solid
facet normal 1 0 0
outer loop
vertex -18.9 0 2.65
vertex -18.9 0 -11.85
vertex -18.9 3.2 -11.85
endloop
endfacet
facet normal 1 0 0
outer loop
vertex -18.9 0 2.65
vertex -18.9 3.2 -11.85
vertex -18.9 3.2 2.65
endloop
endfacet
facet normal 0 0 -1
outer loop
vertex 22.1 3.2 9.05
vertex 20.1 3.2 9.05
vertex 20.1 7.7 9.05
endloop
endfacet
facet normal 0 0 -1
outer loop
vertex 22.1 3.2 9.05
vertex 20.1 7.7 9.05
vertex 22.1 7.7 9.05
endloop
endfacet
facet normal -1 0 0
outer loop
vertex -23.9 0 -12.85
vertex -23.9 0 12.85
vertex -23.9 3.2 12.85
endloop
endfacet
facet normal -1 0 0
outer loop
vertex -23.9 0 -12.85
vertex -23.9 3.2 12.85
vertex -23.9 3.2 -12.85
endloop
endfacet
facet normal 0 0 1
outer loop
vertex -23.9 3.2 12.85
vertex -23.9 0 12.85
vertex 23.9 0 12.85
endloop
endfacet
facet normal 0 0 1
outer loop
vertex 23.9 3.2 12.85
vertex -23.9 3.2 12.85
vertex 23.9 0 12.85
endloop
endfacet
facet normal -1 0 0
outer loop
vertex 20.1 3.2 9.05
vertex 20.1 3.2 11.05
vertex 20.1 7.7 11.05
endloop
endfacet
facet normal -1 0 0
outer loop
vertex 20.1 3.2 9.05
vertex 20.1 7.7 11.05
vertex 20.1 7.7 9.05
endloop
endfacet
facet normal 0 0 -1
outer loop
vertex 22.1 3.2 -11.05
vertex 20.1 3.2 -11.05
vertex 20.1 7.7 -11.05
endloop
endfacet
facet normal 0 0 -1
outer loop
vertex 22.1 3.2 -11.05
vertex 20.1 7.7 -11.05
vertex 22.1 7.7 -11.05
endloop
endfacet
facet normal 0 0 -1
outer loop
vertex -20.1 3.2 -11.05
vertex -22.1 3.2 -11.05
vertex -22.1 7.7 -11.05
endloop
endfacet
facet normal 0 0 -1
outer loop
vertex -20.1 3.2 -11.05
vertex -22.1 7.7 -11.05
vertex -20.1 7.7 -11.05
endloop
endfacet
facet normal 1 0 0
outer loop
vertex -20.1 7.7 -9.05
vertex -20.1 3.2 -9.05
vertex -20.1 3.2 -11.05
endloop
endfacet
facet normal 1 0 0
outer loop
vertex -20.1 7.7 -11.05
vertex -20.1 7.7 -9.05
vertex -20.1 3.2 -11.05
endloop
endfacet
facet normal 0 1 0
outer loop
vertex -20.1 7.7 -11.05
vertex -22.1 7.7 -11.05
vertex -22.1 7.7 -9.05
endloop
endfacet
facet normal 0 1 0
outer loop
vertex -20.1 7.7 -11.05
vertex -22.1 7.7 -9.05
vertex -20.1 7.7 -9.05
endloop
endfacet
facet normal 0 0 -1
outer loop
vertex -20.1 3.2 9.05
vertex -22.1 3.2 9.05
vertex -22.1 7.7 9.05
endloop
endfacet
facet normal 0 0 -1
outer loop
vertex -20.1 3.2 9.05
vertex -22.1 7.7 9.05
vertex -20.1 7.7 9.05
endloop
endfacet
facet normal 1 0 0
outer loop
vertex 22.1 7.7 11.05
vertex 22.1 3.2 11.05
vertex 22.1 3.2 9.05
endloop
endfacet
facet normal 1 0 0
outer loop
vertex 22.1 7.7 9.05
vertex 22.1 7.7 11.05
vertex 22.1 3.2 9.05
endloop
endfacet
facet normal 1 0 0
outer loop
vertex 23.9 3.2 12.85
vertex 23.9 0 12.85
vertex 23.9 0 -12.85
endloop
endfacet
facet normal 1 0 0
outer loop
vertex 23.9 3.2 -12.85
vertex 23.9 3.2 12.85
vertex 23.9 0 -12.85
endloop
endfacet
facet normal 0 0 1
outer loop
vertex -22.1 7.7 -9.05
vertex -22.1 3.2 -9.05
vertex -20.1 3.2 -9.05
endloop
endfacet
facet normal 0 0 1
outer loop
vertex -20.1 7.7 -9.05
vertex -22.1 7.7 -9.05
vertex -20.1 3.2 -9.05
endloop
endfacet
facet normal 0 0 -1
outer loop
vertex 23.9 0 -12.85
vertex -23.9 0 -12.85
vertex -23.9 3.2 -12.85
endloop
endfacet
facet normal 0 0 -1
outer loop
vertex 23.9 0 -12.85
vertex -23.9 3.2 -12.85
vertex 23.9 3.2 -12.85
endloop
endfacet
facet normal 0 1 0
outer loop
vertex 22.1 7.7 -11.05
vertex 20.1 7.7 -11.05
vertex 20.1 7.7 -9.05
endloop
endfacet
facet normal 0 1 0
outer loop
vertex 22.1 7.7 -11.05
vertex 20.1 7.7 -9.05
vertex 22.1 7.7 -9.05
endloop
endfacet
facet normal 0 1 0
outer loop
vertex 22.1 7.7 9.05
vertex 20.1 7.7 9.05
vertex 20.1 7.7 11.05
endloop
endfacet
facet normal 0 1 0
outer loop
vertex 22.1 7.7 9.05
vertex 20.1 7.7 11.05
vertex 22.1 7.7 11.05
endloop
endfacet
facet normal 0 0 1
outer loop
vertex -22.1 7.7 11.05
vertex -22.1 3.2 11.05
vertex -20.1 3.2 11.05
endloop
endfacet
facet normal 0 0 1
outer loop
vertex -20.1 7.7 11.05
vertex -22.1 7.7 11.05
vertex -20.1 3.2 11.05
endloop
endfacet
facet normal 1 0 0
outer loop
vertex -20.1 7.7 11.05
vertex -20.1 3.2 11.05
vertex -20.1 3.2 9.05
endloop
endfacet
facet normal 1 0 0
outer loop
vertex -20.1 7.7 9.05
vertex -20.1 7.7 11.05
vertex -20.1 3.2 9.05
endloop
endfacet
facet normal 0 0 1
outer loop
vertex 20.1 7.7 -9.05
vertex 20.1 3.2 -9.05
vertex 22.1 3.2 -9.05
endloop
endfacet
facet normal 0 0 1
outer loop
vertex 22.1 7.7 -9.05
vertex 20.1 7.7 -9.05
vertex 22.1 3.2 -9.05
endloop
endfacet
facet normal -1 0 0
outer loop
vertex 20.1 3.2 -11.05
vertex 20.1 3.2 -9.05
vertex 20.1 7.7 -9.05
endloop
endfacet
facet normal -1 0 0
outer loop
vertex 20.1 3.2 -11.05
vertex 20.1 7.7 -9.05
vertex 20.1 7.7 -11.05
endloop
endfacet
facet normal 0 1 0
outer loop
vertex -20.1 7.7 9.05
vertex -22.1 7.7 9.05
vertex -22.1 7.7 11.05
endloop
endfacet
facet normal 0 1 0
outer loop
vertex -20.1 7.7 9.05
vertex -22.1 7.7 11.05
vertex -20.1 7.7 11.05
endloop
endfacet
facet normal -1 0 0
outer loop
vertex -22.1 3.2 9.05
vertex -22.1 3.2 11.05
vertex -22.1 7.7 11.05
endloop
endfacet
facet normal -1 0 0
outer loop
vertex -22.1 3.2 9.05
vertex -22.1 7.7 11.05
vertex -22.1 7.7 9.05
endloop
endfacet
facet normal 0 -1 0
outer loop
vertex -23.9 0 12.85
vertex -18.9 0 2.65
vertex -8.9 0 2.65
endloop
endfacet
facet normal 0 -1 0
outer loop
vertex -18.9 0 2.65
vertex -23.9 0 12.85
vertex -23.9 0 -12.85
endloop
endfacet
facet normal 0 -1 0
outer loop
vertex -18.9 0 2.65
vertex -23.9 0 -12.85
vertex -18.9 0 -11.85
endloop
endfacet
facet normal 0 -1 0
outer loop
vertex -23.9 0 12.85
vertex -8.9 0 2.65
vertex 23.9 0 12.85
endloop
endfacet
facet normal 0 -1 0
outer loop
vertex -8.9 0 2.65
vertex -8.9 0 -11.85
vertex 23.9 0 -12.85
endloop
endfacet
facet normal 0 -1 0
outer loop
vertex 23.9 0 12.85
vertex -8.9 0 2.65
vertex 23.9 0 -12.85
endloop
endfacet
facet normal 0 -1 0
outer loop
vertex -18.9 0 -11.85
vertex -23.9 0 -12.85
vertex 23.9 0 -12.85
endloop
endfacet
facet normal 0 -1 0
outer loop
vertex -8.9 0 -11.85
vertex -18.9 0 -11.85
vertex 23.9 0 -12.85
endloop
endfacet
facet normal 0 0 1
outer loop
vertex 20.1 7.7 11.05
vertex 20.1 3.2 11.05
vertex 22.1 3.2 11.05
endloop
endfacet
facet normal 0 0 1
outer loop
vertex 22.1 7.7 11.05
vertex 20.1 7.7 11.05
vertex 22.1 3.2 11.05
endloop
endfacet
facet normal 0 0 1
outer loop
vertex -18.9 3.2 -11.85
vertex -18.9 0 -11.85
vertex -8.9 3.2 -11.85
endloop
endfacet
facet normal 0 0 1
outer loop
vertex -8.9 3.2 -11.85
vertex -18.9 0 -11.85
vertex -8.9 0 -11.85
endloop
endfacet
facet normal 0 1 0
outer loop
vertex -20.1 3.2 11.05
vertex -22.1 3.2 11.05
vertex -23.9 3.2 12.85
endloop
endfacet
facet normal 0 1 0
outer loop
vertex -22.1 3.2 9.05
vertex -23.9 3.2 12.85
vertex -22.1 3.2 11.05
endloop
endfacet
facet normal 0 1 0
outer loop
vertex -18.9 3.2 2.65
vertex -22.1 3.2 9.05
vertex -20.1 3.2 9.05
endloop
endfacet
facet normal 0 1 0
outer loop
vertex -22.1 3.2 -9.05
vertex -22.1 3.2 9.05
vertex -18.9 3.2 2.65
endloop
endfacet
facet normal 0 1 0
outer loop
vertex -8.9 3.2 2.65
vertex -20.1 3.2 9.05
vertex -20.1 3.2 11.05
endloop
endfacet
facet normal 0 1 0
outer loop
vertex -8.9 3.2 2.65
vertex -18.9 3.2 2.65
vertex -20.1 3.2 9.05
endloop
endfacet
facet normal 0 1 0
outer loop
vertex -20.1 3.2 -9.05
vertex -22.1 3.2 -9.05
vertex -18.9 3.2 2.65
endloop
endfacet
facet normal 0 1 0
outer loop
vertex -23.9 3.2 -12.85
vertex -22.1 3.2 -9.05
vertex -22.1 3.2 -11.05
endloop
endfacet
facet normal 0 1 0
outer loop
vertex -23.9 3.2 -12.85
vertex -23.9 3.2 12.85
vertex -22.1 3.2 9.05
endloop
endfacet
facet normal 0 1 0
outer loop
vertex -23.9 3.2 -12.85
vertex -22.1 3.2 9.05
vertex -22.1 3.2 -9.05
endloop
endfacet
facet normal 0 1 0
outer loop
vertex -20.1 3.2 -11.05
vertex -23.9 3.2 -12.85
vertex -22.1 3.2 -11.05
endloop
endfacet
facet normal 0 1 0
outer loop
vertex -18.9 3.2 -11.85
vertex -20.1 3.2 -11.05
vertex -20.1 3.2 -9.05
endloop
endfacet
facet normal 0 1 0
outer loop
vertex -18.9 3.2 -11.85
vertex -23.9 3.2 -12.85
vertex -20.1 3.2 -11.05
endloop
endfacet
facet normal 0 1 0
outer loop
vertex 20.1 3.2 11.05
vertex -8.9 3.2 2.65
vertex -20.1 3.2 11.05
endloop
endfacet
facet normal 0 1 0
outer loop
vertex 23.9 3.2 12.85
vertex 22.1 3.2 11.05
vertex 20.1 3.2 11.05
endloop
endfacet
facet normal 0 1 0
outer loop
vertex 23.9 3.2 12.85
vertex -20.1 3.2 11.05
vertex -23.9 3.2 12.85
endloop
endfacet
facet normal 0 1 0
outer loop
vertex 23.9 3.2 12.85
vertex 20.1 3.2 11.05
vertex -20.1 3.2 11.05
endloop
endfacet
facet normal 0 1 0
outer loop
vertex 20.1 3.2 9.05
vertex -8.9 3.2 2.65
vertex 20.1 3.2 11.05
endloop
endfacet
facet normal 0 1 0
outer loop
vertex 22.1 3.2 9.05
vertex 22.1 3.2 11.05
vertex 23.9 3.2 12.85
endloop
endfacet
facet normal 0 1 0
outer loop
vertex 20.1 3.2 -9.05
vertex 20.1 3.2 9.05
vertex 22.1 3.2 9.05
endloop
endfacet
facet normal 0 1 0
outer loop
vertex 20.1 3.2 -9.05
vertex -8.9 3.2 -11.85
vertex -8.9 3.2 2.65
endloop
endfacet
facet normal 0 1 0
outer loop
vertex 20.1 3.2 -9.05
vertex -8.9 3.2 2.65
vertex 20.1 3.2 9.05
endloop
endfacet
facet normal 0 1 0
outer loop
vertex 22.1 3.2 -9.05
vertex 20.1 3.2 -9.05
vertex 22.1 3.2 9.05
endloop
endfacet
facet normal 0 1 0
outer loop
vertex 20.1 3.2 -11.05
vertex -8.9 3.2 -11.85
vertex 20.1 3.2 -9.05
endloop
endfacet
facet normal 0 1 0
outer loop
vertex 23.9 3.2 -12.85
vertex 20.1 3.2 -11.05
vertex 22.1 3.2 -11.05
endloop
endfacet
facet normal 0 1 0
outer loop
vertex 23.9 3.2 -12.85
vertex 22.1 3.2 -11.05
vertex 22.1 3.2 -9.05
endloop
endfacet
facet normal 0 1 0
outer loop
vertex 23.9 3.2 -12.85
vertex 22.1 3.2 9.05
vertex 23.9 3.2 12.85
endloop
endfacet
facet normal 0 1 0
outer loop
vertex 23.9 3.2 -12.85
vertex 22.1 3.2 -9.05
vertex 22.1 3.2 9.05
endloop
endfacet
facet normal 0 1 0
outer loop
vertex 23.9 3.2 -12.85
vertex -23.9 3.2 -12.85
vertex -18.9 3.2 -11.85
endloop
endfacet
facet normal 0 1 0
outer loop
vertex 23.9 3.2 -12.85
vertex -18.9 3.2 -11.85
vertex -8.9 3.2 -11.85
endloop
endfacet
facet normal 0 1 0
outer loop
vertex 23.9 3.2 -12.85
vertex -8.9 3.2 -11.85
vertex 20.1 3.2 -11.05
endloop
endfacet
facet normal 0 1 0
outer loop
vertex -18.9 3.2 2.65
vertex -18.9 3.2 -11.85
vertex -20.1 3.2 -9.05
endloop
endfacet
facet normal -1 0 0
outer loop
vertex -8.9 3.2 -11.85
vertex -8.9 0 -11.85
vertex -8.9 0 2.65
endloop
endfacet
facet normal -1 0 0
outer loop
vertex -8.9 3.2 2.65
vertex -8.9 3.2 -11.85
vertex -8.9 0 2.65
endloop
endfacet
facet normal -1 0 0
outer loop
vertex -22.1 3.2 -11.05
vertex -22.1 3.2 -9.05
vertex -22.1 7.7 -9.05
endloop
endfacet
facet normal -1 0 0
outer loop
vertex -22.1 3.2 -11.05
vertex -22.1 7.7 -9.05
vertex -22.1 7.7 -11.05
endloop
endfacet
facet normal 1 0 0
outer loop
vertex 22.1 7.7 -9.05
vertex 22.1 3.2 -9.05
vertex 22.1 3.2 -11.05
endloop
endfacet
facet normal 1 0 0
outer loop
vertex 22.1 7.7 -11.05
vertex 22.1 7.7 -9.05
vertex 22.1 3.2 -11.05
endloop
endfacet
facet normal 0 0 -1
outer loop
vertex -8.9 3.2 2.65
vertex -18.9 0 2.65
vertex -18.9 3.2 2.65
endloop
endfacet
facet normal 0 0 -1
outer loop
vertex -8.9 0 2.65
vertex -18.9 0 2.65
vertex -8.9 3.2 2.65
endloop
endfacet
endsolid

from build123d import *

# Parameters (mm, degrees)
SCHIZZO1_W                   = 47.8
SCHIZZO1_H                   = 25.7
ESTRUSIONE_ESTRUSIONE2_DEPTH = 3.2
SCHIZZO3_W                   = 2
SCHIZZO3_H                   = 2
ESTRUSIONE_ESTRUSIONE4_DEPTH = 4.5
SCHIZZO4_W                   = 10
SCHIZZO4_H                   = 14.5
TAGLIO_ESTRUSIONE1_DEPTH     = 5


with BuildPart() as part:
    # Schizzo1 → Estrusione-Estrusione2 (new body)
    with BuildSketch(Plane(origin=(0, 0, 0), x_dir=(1, 0, 0), z_dir=(0, 1, 0))):
        Rectangle(SCHIZZO1_W, SCHIZZO1_H)
    extrude(amount=ESTRUSIONE_ESTRUSIONE2_DEPTH)

    # Schizzo3 → Estrusione-Estrusione4 (add)
    with BuildSketch(Plane(origin=(0, 3.2, 0), x_dir=(1, 0, 0), z_dir=(0, 1, 0))):
        with Locations((21.1, -10.05)):
            Rectangle(SCHIZZO3_W, SCHIZZO3_H)
        with Locations((21.1, 10.05)):
            Rectangle(SCHIZZO3_W, SCHIZZO3_H)
        with Locations((-21.1, 10.05)):
            Rectangle(SCHIZZO3_W, SCHIZZO3_H)
        with Locations((-21.1, -10.05)):
            Rectangle(SCHIZZO3_W, SCHIZZO3_H)
    extrude(amount=ESTRUSIONE_ESTRUSIONE4_DEPTH)

    # Schizzo4 → Taglio-Estrusione1 (cut)
    with BuildSketch(Plane.XZ):
        with Locations((-13.9, -4.6)):
            Rectangle(SCHIZZO4_W, SCHIZZO4_H)
    extrude(amount=-TAGLIO_ESTRUSIONE1_DEPTH, mode=Mode.SUBTRACT)


solid = part.part
